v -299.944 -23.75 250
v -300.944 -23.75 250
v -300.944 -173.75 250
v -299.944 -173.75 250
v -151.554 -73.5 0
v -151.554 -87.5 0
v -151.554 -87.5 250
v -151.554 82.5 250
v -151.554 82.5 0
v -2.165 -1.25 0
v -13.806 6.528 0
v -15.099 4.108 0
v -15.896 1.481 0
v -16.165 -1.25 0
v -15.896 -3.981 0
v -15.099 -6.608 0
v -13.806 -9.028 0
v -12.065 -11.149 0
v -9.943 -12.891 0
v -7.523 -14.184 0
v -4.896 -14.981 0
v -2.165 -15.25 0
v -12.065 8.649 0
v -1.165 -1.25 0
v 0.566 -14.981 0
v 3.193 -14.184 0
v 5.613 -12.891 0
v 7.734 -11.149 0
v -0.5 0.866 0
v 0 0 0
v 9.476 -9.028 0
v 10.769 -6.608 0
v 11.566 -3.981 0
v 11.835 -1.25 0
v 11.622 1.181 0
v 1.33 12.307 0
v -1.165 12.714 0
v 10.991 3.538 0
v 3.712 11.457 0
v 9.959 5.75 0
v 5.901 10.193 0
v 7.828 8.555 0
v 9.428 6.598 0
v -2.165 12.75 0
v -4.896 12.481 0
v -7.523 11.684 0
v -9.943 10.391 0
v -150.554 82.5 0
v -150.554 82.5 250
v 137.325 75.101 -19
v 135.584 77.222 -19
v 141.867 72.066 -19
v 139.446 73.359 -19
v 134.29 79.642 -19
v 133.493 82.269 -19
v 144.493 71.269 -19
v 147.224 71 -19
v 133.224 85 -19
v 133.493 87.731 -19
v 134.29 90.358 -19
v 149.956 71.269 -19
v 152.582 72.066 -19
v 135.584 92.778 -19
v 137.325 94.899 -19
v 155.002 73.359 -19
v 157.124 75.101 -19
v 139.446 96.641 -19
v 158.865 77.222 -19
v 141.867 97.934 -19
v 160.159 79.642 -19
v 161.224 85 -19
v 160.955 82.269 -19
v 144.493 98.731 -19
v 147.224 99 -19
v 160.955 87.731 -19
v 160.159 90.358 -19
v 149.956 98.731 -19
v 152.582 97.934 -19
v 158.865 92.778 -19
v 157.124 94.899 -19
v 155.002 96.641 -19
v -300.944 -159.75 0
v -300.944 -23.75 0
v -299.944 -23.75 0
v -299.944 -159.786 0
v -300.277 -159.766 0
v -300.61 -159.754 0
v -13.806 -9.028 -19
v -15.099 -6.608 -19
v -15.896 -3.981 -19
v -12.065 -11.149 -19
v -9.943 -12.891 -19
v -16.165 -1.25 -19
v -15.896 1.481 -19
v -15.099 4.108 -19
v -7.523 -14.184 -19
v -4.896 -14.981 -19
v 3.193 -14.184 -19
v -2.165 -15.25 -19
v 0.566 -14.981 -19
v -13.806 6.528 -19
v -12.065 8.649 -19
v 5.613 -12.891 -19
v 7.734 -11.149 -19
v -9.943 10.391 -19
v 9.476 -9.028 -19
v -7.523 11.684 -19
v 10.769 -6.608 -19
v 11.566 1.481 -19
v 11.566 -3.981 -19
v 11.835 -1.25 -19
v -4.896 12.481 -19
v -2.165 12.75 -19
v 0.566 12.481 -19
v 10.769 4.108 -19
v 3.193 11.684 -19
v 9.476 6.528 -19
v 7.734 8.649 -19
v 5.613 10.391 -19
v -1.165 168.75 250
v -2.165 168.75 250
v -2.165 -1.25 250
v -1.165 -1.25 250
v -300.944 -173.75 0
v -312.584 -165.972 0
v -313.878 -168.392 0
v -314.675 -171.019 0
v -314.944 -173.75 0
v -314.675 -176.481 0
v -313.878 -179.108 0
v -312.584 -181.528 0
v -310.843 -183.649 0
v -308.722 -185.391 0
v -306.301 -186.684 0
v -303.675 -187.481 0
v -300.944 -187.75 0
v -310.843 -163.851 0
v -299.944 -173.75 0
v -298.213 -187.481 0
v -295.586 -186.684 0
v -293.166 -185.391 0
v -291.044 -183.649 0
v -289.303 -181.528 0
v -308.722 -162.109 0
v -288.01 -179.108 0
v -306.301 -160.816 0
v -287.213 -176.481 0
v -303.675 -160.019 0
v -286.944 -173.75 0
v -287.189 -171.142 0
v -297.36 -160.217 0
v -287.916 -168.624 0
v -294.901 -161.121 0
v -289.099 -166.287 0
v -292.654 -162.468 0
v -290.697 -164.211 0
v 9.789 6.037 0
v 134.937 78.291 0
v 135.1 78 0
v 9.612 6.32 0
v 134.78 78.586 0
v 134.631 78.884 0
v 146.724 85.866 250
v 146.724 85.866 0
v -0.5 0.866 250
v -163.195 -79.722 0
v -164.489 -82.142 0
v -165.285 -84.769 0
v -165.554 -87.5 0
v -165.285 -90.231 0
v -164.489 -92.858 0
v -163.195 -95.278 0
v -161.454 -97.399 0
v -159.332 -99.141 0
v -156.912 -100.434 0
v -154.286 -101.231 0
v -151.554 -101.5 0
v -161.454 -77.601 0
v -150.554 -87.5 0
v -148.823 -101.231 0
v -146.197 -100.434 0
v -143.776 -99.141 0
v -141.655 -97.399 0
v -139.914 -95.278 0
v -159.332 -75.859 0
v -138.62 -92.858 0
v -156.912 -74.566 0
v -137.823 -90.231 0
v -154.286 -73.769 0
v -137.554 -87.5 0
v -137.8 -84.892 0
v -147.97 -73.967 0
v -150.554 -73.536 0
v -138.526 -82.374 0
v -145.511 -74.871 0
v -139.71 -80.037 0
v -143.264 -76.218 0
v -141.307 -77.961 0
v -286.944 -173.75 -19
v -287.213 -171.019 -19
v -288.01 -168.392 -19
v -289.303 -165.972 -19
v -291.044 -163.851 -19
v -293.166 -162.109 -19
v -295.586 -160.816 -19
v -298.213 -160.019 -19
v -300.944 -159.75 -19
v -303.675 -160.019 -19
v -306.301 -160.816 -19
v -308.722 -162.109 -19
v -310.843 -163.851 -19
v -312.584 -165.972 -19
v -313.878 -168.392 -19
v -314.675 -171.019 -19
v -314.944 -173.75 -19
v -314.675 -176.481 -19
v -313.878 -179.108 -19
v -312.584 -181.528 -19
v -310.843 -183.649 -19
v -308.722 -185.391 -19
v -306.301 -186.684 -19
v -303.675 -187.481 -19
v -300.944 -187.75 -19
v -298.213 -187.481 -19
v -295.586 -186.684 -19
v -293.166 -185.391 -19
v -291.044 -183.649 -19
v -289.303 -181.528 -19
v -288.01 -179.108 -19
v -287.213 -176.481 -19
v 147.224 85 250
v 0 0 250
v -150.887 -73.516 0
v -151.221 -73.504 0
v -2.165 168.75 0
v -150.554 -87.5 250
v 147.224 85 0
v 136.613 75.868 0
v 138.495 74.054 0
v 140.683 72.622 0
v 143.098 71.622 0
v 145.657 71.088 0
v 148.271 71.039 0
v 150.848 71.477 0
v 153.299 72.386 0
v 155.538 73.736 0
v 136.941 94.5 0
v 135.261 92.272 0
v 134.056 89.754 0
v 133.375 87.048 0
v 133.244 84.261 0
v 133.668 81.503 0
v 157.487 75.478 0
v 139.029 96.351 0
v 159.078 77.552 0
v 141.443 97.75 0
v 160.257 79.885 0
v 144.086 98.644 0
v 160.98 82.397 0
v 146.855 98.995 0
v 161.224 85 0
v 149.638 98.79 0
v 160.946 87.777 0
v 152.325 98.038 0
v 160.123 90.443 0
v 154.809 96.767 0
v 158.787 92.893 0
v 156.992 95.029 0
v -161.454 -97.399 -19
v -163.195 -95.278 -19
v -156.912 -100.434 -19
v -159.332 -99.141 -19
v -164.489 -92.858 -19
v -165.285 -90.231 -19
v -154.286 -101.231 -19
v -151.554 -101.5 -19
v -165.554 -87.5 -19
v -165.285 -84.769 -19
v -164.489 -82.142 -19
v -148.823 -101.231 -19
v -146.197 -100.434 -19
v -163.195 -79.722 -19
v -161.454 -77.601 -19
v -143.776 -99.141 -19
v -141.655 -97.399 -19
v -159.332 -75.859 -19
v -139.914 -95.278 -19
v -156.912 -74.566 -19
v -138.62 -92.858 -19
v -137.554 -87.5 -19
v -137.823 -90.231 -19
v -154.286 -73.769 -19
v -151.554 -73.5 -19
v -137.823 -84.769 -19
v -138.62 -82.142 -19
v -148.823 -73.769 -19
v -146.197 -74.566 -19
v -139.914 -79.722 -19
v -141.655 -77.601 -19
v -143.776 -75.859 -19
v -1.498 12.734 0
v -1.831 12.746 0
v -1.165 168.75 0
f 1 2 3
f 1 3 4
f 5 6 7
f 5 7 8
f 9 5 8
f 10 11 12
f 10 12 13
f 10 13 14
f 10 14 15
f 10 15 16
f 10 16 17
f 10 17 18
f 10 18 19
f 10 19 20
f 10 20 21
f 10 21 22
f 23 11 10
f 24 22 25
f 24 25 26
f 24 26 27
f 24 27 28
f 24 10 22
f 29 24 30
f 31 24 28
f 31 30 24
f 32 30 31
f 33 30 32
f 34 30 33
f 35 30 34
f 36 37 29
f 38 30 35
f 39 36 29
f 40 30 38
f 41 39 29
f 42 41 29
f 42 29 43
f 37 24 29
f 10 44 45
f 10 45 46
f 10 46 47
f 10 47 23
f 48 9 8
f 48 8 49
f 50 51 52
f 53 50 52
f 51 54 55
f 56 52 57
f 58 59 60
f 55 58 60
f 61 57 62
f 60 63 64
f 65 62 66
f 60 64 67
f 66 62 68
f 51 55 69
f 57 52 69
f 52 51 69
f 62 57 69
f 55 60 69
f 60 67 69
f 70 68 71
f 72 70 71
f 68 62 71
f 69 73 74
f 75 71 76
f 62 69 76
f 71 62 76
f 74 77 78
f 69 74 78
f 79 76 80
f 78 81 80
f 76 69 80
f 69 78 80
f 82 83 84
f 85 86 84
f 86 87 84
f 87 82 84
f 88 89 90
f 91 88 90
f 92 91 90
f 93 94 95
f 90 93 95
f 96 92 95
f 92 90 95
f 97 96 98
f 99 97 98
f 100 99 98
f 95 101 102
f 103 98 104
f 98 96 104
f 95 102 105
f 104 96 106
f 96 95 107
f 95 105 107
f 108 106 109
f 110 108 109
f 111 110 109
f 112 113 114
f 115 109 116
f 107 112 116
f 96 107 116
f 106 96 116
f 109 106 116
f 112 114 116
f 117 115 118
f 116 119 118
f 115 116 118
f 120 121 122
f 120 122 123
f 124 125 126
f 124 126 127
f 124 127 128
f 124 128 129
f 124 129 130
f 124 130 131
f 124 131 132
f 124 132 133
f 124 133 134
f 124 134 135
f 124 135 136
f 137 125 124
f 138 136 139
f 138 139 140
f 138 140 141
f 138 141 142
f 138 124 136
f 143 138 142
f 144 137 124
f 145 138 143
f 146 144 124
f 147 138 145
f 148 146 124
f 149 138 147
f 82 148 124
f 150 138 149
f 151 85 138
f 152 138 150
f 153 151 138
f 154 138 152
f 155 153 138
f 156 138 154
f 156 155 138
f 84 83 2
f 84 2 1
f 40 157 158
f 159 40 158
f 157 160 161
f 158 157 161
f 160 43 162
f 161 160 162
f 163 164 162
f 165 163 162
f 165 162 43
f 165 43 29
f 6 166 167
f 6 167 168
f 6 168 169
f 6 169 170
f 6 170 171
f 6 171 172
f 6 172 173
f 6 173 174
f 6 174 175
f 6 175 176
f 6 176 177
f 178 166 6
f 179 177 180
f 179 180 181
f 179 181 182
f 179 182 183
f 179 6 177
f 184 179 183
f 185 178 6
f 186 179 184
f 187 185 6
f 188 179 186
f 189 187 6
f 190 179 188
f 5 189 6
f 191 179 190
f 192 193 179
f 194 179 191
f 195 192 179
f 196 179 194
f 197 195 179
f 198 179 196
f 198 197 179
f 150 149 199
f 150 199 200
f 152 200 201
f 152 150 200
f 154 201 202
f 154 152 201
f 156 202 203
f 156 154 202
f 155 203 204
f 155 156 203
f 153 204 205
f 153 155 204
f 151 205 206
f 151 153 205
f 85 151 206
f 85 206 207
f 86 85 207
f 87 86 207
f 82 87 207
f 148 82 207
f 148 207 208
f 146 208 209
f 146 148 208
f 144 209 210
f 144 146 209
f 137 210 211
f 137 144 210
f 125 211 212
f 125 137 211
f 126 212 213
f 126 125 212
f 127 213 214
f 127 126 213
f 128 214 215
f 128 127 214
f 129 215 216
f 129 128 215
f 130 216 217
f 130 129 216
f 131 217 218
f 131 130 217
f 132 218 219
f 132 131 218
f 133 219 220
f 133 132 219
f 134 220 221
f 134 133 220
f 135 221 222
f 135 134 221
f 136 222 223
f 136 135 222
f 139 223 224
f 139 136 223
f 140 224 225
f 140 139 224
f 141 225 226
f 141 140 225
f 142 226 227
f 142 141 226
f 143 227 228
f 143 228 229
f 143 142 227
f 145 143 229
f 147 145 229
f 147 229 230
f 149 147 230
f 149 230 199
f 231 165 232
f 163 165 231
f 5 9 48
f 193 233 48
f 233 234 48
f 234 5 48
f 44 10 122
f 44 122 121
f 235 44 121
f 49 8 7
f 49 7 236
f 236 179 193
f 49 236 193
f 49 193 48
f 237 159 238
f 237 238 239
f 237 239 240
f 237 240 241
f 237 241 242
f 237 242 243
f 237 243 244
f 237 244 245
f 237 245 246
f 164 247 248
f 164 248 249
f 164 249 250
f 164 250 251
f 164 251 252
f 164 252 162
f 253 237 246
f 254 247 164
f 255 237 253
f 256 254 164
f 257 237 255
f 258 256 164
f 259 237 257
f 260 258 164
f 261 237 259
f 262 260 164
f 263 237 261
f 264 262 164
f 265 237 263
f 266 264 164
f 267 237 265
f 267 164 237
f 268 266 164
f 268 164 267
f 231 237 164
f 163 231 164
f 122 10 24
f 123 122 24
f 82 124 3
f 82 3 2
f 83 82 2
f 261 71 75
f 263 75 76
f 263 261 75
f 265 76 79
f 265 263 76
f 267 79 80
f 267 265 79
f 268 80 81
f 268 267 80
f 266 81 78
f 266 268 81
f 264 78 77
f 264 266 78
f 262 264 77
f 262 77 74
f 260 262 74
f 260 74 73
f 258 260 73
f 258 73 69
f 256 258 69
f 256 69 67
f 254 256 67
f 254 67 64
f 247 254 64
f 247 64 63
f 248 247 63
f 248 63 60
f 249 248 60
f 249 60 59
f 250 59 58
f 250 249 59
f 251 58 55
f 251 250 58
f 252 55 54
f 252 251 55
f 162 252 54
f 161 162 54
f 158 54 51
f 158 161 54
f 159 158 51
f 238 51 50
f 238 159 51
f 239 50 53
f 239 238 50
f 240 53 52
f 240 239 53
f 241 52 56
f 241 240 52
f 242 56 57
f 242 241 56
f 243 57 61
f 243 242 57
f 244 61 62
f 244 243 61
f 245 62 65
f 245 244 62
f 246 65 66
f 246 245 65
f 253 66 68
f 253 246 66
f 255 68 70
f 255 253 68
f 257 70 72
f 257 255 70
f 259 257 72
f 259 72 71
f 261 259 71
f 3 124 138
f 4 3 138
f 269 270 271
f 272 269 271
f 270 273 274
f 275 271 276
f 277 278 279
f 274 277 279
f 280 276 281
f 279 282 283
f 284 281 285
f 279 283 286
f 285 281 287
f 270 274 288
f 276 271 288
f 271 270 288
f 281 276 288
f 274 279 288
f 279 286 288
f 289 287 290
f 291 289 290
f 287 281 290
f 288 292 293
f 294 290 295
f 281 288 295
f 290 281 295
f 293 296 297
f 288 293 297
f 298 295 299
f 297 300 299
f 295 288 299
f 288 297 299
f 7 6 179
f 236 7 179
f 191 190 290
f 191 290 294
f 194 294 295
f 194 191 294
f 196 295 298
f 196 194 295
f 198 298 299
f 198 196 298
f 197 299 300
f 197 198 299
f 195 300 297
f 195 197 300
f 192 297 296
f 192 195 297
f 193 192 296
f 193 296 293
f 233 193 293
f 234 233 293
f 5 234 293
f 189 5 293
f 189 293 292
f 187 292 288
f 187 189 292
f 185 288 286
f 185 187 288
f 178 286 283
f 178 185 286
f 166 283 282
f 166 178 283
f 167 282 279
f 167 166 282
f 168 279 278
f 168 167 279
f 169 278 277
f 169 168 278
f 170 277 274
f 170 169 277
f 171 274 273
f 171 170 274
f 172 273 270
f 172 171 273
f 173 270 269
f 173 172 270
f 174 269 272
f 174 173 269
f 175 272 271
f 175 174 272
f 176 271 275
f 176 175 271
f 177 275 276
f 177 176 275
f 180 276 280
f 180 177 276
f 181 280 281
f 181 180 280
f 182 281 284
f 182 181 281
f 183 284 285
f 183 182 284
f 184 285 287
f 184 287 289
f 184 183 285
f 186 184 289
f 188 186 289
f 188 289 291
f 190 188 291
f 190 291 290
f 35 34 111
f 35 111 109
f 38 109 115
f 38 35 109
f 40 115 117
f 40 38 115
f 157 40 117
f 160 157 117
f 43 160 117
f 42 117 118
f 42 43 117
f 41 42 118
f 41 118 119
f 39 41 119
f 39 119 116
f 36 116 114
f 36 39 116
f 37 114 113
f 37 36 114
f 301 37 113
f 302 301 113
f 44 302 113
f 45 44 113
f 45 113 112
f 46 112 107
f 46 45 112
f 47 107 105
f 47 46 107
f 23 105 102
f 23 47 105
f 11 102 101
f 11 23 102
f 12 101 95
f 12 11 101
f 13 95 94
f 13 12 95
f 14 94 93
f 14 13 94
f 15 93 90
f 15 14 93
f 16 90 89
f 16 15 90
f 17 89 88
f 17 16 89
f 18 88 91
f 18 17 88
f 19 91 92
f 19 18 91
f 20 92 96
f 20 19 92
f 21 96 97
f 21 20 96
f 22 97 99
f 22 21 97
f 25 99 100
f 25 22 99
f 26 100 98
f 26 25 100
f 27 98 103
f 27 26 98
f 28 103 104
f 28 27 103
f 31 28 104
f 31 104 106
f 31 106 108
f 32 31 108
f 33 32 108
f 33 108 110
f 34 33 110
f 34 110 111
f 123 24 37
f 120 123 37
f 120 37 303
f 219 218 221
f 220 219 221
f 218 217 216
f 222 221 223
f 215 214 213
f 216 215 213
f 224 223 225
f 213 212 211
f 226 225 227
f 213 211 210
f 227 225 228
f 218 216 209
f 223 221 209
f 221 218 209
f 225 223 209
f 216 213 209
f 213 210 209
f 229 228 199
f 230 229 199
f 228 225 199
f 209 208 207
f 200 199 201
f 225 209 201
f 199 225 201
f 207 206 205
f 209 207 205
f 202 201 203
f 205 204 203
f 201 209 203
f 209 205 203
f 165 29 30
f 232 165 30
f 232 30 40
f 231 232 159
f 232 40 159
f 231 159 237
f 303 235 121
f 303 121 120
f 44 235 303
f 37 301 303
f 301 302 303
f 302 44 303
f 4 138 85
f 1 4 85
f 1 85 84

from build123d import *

# Parameters (mm, degrees)
EXTRUDE_2_DEPTH   = 250
SKETCH_1_W        = 1
SKETCH_1_H        = 170
EXTRUDE_2_2_DEPTH = 250
EXTRUDE_2_3_DEPTH = 250
SKETCH_1_H_2      = 150
EXTRUDE_2_4_DEPTH = 250
SKETCH_2_R        = 14
EXTRUDE_3_DEPTH   = 19


with BuildPart() as part:
    # 草图1 → 凸台-拉伸2 (new body)
    with BuildSketch(Plane.XY):
        Polygon((0, 0), (147.224318643, 85), (146.724318643, 85.866025404), (-0.5, 0.866025404), align=None)
    extrude(amount=EXTRUDE_2_DEPTH)



with BuildPart() as body_2:
    # 草图1 → Extrude 2 2 (new body)
    with BuildSketch(Plane.XY):
        with Locations((-1.665063509, 83.75)):
            Rectangle(SKETCH_1_W, SKETCH_1_H)
    extrude(amount=EXTRUDE_2_2_DEPTH)


with BuildPart() as body_3:
    # 草图1 → Extrude 2 3 (new body)
    with BuildSketch(Plane.XY):
        with Locations((-151.054445662, -2.5)):
            Rectangle(SKETCH_1_W, SKETCH_1_H)
    extrude(amount=EXTRUDE_2_3_DEPTH)


with BuildPart() as body_4:
    # 草图1 → Extrude 2 4 (new body)
    with BuildSketch(Plane.XY):
        with Locations((-300.443827815, -98.75)):
            Rectangle(SKETCH_1_W, SKETCH_1_H_2)
    extrude(amount=EXTRUDE_2_4_DEPTH)


with BuildPart() as part_1:
    add(part.part)

    add(body_2.part)  # 凸台-拉伸3 merges body 2

    add(body_3.part)  # 凸台-拉伸3 merges body 3

    add(body_4.part)  # 凸台-拉伸3 merges body 4
    # 草图2 → 凸台-拉伸3 (add)
    with BuildSketch(Plane.XY):
        with Locations((147.224318643, 85)):
            Circle(SKETCH_2_R)
        with Locations((-2.165063509, -1.25)):
            Circle(SKETCH_2_R)
        with Locations((-151.554445662, -87.5)):
            Circle(SKETCH_2_R)
        with Locations((-300.943827815, -173.75)):
            Circle(SKETCH_2_R)
    extrude(amount=-EXTRUDE_3_DEPTH)


solid = part_1.part
